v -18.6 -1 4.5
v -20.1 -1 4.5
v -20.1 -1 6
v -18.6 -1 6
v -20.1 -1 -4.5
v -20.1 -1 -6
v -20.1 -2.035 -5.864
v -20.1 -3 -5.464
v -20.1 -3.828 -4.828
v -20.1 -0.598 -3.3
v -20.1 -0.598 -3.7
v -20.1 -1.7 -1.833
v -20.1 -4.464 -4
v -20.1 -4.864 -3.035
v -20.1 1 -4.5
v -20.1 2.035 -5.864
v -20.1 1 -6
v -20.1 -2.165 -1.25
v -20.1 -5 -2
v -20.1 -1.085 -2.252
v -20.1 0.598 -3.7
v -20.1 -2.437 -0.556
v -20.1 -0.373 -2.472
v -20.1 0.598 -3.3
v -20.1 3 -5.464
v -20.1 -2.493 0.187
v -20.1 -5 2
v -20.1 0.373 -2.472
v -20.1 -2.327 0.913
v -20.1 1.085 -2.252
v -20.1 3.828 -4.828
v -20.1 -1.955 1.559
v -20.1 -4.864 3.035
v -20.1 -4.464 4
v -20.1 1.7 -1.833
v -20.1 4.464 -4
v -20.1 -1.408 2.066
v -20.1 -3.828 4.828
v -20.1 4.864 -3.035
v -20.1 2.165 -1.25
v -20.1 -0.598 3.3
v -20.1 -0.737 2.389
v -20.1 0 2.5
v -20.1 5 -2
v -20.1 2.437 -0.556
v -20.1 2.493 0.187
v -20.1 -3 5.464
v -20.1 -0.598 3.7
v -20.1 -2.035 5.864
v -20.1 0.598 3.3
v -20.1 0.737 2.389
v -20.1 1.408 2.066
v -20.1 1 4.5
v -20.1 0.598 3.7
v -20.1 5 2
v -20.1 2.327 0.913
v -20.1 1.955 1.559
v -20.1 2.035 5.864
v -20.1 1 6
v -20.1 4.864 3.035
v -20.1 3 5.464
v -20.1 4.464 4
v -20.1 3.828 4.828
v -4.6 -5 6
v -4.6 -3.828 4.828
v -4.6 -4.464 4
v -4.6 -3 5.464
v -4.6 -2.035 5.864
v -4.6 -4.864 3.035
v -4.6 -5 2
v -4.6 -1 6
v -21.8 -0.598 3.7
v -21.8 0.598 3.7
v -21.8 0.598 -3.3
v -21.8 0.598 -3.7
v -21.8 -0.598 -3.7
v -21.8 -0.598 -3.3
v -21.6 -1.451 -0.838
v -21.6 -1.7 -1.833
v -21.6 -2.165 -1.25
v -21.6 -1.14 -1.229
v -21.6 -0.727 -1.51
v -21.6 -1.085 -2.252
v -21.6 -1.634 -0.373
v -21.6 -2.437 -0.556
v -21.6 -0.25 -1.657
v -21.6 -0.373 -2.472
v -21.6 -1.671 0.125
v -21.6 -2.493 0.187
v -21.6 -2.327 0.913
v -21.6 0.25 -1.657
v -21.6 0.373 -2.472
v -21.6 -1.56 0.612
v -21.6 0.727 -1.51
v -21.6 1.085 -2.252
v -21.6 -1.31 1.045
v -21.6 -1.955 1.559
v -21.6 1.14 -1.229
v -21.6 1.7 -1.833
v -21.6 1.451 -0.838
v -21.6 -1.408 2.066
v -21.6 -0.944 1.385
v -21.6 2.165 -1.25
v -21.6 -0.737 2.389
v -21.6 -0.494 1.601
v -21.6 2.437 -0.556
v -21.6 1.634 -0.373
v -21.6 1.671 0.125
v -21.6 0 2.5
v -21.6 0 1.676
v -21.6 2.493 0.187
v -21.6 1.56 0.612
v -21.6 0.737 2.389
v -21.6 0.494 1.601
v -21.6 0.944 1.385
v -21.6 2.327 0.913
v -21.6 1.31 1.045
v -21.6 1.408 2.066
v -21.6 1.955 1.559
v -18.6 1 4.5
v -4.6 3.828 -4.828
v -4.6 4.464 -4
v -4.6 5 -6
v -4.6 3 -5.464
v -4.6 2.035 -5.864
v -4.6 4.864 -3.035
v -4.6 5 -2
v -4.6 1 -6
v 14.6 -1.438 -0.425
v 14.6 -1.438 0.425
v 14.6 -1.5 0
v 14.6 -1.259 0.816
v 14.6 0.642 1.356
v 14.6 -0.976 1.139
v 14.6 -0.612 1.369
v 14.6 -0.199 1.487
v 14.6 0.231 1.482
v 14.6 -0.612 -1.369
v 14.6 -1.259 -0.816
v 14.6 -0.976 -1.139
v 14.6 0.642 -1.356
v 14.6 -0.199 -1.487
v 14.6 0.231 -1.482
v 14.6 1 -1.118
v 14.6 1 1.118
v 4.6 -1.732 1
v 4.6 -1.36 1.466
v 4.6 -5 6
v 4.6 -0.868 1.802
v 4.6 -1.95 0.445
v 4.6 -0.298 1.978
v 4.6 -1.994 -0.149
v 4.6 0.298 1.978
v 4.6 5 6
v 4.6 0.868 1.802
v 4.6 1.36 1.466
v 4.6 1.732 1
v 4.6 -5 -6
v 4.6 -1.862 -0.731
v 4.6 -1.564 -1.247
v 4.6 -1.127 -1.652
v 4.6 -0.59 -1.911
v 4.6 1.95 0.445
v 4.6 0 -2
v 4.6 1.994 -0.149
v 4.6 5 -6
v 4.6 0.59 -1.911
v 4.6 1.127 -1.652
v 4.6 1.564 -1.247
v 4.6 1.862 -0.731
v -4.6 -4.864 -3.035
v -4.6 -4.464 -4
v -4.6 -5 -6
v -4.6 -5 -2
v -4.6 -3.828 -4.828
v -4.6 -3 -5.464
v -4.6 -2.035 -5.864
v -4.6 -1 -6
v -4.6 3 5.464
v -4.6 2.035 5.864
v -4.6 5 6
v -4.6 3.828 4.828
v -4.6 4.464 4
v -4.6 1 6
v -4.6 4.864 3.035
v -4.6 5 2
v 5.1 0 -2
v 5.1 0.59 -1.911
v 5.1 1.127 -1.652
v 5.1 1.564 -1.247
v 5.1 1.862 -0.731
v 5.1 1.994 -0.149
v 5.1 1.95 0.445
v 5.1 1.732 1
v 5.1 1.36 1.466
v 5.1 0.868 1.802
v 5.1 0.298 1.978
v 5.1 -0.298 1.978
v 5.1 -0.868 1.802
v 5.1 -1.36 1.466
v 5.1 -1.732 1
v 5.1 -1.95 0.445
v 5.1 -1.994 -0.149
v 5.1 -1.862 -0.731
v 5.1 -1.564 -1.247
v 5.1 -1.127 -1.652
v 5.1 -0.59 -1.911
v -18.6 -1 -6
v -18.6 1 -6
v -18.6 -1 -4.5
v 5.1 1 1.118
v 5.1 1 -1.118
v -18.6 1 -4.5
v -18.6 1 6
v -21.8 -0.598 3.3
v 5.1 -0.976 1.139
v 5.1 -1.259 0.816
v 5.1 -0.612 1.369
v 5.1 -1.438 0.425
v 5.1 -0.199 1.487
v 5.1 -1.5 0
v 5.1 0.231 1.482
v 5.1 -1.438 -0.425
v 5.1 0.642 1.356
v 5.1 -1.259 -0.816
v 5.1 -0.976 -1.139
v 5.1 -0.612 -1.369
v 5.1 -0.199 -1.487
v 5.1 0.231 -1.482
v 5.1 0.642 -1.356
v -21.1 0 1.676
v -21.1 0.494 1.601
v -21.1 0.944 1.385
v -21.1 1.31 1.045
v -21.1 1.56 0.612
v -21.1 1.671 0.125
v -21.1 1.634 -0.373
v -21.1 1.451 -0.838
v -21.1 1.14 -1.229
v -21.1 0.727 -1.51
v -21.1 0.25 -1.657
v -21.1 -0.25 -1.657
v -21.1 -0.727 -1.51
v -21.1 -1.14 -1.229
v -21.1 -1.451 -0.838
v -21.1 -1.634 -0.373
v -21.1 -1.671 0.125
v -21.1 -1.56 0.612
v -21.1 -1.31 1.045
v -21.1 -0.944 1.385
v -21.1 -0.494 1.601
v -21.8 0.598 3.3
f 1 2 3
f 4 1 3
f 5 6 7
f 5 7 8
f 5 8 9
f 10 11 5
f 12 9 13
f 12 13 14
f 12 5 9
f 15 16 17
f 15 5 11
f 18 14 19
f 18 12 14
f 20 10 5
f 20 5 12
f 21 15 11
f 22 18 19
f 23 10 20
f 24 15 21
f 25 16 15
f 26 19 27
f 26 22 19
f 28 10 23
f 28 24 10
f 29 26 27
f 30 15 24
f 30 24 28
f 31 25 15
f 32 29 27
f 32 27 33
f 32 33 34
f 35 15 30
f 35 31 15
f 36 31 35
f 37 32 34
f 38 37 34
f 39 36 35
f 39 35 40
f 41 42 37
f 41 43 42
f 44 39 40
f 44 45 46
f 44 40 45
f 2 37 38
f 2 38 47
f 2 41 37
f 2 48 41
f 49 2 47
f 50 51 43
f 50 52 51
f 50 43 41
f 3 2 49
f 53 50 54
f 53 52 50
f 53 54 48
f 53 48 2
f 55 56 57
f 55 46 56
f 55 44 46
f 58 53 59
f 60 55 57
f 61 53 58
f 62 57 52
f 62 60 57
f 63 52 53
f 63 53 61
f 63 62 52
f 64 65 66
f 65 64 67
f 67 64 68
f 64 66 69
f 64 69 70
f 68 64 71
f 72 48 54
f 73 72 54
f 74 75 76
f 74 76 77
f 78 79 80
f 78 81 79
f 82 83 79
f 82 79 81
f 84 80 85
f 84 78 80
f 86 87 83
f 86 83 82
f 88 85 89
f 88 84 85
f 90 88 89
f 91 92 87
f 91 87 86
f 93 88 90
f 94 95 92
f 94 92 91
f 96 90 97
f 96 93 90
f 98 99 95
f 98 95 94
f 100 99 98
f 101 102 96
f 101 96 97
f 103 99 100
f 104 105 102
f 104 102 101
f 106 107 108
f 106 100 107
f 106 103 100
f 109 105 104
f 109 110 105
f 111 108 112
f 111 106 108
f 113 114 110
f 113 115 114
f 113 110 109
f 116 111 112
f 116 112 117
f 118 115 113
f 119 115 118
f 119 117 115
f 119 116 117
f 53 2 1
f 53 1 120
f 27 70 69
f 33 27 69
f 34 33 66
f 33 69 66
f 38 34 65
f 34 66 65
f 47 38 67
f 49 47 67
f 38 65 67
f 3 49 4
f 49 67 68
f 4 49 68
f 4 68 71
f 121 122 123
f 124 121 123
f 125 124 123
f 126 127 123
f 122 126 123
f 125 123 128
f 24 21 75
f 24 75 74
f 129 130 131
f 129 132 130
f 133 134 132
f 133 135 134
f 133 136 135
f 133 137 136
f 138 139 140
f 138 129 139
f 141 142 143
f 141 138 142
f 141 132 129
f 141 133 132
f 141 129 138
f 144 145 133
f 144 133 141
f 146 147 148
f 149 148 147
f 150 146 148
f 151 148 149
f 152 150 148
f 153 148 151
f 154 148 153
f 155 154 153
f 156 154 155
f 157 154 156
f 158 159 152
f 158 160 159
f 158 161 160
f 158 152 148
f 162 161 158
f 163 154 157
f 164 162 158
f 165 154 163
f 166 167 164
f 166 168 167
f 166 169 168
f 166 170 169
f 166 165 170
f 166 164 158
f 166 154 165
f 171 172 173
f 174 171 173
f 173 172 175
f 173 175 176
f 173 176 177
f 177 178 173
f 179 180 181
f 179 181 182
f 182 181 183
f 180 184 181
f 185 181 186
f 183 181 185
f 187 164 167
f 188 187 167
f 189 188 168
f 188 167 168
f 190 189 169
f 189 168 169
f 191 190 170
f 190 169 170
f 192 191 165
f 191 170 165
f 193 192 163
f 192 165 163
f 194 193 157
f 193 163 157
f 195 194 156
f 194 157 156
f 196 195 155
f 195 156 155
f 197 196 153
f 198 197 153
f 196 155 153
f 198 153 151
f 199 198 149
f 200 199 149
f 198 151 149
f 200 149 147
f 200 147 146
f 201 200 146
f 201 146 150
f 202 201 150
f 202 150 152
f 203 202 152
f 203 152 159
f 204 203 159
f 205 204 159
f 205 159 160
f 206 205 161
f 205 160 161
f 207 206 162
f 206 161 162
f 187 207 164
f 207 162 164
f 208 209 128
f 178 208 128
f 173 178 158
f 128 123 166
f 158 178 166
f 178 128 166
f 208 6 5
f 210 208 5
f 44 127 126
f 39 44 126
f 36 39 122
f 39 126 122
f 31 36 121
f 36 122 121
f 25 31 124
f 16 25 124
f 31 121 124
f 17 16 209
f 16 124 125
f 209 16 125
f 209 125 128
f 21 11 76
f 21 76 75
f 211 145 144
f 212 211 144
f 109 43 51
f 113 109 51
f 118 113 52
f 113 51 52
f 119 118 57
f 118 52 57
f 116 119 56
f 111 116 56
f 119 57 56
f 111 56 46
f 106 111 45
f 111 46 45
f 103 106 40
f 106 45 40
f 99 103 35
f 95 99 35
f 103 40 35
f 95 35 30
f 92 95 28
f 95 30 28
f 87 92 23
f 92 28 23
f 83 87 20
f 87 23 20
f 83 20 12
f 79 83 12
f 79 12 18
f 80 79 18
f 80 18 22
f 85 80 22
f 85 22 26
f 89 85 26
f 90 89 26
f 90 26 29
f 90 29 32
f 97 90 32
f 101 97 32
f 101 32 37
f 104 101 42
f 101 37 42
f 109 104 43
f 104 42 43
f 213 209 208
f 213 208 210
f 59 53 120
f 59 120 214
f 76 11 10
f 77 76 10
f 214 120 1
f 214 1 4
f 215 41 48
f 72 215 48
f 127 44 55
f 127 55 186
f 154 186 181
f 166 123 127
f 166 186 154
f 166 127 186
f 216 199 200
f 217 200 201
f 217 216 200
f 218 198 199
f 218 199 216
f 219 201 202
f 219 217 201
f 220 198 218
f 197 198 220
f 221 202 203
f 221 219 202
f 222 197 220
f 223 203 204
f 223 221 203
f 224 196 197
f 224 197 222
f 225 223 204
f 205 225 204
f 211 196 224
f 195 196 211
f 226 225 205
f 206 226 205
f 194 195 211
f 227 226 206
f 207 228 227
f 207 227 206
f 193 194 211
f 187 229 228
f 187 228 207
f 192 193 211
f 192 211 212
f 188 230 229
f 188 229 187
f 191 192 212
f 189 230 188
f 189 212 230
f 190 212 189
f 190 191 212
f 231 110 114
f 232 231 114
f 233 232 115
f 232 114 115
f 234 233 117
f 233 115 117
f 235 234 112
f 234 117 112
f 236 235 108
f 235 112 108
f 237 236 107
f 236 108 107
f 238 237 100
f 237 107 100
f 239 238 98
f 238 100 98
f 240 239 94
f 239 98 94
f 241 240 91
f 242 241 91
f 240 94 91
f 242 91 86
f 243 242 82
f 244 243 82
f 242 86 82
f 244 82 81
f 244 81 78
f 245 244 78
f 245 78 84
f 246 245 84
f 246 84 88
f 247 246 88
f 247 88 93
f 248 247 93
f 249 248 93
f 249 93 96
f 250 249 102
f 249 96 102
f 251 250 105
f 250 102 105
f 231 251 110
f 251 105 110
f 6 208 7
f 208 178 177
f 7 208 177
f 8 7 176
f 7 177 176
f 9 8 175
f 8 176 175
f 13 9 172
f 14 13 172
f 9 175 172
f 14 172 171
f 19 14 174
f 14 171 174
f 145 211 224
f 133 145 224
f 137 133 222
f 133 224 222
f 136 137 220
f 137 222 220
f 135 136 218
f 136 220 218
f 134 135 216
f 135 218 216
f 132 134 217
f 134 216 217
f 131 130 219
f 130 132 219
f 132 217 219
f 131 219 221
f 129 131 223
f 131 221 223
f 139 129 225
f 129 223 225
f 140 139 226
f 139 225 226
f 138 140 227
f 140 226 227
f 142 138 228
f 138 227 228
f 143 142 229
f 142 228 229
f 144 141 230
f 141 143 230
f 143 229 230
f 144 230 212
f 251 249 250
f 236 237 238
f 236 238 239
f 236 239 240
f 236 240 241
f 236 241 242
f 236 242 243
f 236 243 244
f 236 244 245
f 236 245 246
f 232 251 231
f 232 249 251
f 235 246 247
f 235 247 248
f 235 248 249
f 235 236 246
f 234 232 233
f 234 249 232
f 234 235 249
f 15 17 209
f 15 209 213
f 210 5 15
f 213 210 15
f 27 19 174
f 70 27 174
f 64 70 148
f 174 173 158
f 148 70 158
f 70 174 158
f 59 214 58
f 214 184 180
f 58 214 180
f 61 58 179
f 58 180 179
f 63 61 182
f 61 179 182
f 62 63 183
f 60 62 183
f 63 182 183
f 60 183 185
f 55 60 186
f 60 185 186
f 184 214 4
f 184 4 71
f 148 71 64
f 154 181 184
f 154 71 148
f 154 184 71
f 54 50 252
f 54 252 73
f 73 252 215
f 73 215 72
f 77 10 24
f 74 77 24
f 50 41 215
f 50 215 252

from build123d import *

# Parameters (mm, degrees)
SKETCH1_W           = 9.2
SKETCH1_H           = 12
BOSS_EXTRUDE1_DEPTH = 5
SKETCH3_R           = 2
BOSS_EXTRUDE2_DEPTH = 0.5
SKETCH4_R           = 1.5
BOSS_EXTRUDE3_DEPTH = 9.5
CUT_EXTRUDE1_DEPTH  = 9.5
BOSS_EXTRUDE4_DEPTH = 15.5
SKETCH8_W           = 1.5
SKETCH8_H           = 2
CUT_EXTRUDE2_DEPTH  = 1.5
SKETCH9_W           = 0.4
SKETCH9_H           = 1.196619736
BOSS_EXTRUDE5_DEPTH = 1.7
SKETCH10_R          = 2.5
BOSS_EXTRUDE6_DEPTH = 1.5
SKETCH11_R          = 1.675952799
CUT_EXTRUDE3_DEPTH  = 0.5


with BuildPart() as part:
    # Sketch1 → Boss-Extrude1 (new body, symmetric)
    with BuildSketch(Plane(origin=(0, 0, 0), x_dir=(1, 0, 0), z_dir=(0, 1, 0))):
        Rectangle(SKETCH1_W, SKETCH1_H)
    extrude(amount=BOSS_EXTRUDE1_DEPTH, both=True)

    # Sketch3 → Boss-Extrude2 (add)
    with BuildSketch(Plane(origin=(4.6, 0, 0), x_dir=(0, 0, -1), z_dir=(1, 0, 0))):
        Circle(SKETCH3_R)
    extrude(amount=BOSS_EXTRUDE2_DEPTH)

    # Sketch4 → Boss-Extrude3 (add)
    with BuildSketch(Plane(origin=(5.1, 0, 0), x_dir=(0, 0, -1), z_dir=(1, 0, 0))):
        Circle(SKETCH4_R)
    extrude(amount=BOSS_EXTRUDE3_DEPTH)

    # Sketch5 → Cut-Extrude1 (cut)
    with BuildSketch(Plane(origin=(14.6, 0, 0), x_dir=(0, 0, -1), z_dir=(1, 0, 0))):
        with BuildLine():
            Line((-1.118033989, 1), (1.118033989, 1))
            ThreePointArc((1.118033989, 1), (0, 1.5), (-1.118033989, 1))
        make_face()
    extrude(amount=-CUT_EXTRUDE1_DEPTH, mode=Mode.SUBTRACT)

    # Sketch7 → Boss-Extrude4 (add)
    with BuildSketch(Plane.ZY.offset(4.6)):
        with BuildLine():
            Line((-2, -5), (2, -5))
            ThreePointArc((2, -5), (4.828427125, -3.828427125), (6, -1))
            Line((6, -1), (6, 1))
            ThreePointArc((6, 1), (4.828427125, 3.828427125), (2, 5))
            Line((2, 5), (-2, 5))
            ThreePointArc((-2, 5), (-4.828427125, 3.828427125), (-6, 1))
            Line((-6, 1), (-6, -1))
            ThreePointArc((-6, -1), (-4.828427125, -3.828427125), (-2, -5))
        make_face()
    extrude(amount=BOSS_EXTRUDE4_DEPTH)

    # Sketch8 → Cut-Extrude2 (cut)
    with BuildSketch(Plane.ZY.offset(20.1)):
        with Locations((-5.25, 0)):
            Rectangle(SKETCH8_W, SKETCH8_H)
        with Locations((5.25, 0)):
            Rectangle(SKETCH8_W, SKETCH8_H)
    extrude(amount=-CUT_EXTRUDE2_DEPTH, mode=Mode.SUBTRACT)

    # Sketch9 → Boss-Extrude5 (add)
    with BuildSketch(Plane.ZY.offset(20.1)):
        with Locations((-3.5, 0)):
            Rectangle(SKETCH9_W, SKETCH9_H)
        with Locations((3.5, 0)):
            Rectangle(SKETCH9_W, SKETCH9_H)
    extrude(amount=BOSS_EXTRUDE5_DEPTH)

    # Sketch10 → Boss-Extrude6 (add)
    with BuildSketch(Plane.ZY.offset(20.1)):
        Circle(SKETCH10_R)
    extrude(amount=BOSS_EXTRUDE6_DEPTH)

    # Sketch11 → Cut-Extrude3 (cut)
    with BuildSketch(Plane.ZY.offset(21.6)):
        Circle(SKETCH11_R)
    extrude(amount=-CUT_EXTRUDE3_DEPTH, mode=Mode.SUBTRACT)


solid = part.part
